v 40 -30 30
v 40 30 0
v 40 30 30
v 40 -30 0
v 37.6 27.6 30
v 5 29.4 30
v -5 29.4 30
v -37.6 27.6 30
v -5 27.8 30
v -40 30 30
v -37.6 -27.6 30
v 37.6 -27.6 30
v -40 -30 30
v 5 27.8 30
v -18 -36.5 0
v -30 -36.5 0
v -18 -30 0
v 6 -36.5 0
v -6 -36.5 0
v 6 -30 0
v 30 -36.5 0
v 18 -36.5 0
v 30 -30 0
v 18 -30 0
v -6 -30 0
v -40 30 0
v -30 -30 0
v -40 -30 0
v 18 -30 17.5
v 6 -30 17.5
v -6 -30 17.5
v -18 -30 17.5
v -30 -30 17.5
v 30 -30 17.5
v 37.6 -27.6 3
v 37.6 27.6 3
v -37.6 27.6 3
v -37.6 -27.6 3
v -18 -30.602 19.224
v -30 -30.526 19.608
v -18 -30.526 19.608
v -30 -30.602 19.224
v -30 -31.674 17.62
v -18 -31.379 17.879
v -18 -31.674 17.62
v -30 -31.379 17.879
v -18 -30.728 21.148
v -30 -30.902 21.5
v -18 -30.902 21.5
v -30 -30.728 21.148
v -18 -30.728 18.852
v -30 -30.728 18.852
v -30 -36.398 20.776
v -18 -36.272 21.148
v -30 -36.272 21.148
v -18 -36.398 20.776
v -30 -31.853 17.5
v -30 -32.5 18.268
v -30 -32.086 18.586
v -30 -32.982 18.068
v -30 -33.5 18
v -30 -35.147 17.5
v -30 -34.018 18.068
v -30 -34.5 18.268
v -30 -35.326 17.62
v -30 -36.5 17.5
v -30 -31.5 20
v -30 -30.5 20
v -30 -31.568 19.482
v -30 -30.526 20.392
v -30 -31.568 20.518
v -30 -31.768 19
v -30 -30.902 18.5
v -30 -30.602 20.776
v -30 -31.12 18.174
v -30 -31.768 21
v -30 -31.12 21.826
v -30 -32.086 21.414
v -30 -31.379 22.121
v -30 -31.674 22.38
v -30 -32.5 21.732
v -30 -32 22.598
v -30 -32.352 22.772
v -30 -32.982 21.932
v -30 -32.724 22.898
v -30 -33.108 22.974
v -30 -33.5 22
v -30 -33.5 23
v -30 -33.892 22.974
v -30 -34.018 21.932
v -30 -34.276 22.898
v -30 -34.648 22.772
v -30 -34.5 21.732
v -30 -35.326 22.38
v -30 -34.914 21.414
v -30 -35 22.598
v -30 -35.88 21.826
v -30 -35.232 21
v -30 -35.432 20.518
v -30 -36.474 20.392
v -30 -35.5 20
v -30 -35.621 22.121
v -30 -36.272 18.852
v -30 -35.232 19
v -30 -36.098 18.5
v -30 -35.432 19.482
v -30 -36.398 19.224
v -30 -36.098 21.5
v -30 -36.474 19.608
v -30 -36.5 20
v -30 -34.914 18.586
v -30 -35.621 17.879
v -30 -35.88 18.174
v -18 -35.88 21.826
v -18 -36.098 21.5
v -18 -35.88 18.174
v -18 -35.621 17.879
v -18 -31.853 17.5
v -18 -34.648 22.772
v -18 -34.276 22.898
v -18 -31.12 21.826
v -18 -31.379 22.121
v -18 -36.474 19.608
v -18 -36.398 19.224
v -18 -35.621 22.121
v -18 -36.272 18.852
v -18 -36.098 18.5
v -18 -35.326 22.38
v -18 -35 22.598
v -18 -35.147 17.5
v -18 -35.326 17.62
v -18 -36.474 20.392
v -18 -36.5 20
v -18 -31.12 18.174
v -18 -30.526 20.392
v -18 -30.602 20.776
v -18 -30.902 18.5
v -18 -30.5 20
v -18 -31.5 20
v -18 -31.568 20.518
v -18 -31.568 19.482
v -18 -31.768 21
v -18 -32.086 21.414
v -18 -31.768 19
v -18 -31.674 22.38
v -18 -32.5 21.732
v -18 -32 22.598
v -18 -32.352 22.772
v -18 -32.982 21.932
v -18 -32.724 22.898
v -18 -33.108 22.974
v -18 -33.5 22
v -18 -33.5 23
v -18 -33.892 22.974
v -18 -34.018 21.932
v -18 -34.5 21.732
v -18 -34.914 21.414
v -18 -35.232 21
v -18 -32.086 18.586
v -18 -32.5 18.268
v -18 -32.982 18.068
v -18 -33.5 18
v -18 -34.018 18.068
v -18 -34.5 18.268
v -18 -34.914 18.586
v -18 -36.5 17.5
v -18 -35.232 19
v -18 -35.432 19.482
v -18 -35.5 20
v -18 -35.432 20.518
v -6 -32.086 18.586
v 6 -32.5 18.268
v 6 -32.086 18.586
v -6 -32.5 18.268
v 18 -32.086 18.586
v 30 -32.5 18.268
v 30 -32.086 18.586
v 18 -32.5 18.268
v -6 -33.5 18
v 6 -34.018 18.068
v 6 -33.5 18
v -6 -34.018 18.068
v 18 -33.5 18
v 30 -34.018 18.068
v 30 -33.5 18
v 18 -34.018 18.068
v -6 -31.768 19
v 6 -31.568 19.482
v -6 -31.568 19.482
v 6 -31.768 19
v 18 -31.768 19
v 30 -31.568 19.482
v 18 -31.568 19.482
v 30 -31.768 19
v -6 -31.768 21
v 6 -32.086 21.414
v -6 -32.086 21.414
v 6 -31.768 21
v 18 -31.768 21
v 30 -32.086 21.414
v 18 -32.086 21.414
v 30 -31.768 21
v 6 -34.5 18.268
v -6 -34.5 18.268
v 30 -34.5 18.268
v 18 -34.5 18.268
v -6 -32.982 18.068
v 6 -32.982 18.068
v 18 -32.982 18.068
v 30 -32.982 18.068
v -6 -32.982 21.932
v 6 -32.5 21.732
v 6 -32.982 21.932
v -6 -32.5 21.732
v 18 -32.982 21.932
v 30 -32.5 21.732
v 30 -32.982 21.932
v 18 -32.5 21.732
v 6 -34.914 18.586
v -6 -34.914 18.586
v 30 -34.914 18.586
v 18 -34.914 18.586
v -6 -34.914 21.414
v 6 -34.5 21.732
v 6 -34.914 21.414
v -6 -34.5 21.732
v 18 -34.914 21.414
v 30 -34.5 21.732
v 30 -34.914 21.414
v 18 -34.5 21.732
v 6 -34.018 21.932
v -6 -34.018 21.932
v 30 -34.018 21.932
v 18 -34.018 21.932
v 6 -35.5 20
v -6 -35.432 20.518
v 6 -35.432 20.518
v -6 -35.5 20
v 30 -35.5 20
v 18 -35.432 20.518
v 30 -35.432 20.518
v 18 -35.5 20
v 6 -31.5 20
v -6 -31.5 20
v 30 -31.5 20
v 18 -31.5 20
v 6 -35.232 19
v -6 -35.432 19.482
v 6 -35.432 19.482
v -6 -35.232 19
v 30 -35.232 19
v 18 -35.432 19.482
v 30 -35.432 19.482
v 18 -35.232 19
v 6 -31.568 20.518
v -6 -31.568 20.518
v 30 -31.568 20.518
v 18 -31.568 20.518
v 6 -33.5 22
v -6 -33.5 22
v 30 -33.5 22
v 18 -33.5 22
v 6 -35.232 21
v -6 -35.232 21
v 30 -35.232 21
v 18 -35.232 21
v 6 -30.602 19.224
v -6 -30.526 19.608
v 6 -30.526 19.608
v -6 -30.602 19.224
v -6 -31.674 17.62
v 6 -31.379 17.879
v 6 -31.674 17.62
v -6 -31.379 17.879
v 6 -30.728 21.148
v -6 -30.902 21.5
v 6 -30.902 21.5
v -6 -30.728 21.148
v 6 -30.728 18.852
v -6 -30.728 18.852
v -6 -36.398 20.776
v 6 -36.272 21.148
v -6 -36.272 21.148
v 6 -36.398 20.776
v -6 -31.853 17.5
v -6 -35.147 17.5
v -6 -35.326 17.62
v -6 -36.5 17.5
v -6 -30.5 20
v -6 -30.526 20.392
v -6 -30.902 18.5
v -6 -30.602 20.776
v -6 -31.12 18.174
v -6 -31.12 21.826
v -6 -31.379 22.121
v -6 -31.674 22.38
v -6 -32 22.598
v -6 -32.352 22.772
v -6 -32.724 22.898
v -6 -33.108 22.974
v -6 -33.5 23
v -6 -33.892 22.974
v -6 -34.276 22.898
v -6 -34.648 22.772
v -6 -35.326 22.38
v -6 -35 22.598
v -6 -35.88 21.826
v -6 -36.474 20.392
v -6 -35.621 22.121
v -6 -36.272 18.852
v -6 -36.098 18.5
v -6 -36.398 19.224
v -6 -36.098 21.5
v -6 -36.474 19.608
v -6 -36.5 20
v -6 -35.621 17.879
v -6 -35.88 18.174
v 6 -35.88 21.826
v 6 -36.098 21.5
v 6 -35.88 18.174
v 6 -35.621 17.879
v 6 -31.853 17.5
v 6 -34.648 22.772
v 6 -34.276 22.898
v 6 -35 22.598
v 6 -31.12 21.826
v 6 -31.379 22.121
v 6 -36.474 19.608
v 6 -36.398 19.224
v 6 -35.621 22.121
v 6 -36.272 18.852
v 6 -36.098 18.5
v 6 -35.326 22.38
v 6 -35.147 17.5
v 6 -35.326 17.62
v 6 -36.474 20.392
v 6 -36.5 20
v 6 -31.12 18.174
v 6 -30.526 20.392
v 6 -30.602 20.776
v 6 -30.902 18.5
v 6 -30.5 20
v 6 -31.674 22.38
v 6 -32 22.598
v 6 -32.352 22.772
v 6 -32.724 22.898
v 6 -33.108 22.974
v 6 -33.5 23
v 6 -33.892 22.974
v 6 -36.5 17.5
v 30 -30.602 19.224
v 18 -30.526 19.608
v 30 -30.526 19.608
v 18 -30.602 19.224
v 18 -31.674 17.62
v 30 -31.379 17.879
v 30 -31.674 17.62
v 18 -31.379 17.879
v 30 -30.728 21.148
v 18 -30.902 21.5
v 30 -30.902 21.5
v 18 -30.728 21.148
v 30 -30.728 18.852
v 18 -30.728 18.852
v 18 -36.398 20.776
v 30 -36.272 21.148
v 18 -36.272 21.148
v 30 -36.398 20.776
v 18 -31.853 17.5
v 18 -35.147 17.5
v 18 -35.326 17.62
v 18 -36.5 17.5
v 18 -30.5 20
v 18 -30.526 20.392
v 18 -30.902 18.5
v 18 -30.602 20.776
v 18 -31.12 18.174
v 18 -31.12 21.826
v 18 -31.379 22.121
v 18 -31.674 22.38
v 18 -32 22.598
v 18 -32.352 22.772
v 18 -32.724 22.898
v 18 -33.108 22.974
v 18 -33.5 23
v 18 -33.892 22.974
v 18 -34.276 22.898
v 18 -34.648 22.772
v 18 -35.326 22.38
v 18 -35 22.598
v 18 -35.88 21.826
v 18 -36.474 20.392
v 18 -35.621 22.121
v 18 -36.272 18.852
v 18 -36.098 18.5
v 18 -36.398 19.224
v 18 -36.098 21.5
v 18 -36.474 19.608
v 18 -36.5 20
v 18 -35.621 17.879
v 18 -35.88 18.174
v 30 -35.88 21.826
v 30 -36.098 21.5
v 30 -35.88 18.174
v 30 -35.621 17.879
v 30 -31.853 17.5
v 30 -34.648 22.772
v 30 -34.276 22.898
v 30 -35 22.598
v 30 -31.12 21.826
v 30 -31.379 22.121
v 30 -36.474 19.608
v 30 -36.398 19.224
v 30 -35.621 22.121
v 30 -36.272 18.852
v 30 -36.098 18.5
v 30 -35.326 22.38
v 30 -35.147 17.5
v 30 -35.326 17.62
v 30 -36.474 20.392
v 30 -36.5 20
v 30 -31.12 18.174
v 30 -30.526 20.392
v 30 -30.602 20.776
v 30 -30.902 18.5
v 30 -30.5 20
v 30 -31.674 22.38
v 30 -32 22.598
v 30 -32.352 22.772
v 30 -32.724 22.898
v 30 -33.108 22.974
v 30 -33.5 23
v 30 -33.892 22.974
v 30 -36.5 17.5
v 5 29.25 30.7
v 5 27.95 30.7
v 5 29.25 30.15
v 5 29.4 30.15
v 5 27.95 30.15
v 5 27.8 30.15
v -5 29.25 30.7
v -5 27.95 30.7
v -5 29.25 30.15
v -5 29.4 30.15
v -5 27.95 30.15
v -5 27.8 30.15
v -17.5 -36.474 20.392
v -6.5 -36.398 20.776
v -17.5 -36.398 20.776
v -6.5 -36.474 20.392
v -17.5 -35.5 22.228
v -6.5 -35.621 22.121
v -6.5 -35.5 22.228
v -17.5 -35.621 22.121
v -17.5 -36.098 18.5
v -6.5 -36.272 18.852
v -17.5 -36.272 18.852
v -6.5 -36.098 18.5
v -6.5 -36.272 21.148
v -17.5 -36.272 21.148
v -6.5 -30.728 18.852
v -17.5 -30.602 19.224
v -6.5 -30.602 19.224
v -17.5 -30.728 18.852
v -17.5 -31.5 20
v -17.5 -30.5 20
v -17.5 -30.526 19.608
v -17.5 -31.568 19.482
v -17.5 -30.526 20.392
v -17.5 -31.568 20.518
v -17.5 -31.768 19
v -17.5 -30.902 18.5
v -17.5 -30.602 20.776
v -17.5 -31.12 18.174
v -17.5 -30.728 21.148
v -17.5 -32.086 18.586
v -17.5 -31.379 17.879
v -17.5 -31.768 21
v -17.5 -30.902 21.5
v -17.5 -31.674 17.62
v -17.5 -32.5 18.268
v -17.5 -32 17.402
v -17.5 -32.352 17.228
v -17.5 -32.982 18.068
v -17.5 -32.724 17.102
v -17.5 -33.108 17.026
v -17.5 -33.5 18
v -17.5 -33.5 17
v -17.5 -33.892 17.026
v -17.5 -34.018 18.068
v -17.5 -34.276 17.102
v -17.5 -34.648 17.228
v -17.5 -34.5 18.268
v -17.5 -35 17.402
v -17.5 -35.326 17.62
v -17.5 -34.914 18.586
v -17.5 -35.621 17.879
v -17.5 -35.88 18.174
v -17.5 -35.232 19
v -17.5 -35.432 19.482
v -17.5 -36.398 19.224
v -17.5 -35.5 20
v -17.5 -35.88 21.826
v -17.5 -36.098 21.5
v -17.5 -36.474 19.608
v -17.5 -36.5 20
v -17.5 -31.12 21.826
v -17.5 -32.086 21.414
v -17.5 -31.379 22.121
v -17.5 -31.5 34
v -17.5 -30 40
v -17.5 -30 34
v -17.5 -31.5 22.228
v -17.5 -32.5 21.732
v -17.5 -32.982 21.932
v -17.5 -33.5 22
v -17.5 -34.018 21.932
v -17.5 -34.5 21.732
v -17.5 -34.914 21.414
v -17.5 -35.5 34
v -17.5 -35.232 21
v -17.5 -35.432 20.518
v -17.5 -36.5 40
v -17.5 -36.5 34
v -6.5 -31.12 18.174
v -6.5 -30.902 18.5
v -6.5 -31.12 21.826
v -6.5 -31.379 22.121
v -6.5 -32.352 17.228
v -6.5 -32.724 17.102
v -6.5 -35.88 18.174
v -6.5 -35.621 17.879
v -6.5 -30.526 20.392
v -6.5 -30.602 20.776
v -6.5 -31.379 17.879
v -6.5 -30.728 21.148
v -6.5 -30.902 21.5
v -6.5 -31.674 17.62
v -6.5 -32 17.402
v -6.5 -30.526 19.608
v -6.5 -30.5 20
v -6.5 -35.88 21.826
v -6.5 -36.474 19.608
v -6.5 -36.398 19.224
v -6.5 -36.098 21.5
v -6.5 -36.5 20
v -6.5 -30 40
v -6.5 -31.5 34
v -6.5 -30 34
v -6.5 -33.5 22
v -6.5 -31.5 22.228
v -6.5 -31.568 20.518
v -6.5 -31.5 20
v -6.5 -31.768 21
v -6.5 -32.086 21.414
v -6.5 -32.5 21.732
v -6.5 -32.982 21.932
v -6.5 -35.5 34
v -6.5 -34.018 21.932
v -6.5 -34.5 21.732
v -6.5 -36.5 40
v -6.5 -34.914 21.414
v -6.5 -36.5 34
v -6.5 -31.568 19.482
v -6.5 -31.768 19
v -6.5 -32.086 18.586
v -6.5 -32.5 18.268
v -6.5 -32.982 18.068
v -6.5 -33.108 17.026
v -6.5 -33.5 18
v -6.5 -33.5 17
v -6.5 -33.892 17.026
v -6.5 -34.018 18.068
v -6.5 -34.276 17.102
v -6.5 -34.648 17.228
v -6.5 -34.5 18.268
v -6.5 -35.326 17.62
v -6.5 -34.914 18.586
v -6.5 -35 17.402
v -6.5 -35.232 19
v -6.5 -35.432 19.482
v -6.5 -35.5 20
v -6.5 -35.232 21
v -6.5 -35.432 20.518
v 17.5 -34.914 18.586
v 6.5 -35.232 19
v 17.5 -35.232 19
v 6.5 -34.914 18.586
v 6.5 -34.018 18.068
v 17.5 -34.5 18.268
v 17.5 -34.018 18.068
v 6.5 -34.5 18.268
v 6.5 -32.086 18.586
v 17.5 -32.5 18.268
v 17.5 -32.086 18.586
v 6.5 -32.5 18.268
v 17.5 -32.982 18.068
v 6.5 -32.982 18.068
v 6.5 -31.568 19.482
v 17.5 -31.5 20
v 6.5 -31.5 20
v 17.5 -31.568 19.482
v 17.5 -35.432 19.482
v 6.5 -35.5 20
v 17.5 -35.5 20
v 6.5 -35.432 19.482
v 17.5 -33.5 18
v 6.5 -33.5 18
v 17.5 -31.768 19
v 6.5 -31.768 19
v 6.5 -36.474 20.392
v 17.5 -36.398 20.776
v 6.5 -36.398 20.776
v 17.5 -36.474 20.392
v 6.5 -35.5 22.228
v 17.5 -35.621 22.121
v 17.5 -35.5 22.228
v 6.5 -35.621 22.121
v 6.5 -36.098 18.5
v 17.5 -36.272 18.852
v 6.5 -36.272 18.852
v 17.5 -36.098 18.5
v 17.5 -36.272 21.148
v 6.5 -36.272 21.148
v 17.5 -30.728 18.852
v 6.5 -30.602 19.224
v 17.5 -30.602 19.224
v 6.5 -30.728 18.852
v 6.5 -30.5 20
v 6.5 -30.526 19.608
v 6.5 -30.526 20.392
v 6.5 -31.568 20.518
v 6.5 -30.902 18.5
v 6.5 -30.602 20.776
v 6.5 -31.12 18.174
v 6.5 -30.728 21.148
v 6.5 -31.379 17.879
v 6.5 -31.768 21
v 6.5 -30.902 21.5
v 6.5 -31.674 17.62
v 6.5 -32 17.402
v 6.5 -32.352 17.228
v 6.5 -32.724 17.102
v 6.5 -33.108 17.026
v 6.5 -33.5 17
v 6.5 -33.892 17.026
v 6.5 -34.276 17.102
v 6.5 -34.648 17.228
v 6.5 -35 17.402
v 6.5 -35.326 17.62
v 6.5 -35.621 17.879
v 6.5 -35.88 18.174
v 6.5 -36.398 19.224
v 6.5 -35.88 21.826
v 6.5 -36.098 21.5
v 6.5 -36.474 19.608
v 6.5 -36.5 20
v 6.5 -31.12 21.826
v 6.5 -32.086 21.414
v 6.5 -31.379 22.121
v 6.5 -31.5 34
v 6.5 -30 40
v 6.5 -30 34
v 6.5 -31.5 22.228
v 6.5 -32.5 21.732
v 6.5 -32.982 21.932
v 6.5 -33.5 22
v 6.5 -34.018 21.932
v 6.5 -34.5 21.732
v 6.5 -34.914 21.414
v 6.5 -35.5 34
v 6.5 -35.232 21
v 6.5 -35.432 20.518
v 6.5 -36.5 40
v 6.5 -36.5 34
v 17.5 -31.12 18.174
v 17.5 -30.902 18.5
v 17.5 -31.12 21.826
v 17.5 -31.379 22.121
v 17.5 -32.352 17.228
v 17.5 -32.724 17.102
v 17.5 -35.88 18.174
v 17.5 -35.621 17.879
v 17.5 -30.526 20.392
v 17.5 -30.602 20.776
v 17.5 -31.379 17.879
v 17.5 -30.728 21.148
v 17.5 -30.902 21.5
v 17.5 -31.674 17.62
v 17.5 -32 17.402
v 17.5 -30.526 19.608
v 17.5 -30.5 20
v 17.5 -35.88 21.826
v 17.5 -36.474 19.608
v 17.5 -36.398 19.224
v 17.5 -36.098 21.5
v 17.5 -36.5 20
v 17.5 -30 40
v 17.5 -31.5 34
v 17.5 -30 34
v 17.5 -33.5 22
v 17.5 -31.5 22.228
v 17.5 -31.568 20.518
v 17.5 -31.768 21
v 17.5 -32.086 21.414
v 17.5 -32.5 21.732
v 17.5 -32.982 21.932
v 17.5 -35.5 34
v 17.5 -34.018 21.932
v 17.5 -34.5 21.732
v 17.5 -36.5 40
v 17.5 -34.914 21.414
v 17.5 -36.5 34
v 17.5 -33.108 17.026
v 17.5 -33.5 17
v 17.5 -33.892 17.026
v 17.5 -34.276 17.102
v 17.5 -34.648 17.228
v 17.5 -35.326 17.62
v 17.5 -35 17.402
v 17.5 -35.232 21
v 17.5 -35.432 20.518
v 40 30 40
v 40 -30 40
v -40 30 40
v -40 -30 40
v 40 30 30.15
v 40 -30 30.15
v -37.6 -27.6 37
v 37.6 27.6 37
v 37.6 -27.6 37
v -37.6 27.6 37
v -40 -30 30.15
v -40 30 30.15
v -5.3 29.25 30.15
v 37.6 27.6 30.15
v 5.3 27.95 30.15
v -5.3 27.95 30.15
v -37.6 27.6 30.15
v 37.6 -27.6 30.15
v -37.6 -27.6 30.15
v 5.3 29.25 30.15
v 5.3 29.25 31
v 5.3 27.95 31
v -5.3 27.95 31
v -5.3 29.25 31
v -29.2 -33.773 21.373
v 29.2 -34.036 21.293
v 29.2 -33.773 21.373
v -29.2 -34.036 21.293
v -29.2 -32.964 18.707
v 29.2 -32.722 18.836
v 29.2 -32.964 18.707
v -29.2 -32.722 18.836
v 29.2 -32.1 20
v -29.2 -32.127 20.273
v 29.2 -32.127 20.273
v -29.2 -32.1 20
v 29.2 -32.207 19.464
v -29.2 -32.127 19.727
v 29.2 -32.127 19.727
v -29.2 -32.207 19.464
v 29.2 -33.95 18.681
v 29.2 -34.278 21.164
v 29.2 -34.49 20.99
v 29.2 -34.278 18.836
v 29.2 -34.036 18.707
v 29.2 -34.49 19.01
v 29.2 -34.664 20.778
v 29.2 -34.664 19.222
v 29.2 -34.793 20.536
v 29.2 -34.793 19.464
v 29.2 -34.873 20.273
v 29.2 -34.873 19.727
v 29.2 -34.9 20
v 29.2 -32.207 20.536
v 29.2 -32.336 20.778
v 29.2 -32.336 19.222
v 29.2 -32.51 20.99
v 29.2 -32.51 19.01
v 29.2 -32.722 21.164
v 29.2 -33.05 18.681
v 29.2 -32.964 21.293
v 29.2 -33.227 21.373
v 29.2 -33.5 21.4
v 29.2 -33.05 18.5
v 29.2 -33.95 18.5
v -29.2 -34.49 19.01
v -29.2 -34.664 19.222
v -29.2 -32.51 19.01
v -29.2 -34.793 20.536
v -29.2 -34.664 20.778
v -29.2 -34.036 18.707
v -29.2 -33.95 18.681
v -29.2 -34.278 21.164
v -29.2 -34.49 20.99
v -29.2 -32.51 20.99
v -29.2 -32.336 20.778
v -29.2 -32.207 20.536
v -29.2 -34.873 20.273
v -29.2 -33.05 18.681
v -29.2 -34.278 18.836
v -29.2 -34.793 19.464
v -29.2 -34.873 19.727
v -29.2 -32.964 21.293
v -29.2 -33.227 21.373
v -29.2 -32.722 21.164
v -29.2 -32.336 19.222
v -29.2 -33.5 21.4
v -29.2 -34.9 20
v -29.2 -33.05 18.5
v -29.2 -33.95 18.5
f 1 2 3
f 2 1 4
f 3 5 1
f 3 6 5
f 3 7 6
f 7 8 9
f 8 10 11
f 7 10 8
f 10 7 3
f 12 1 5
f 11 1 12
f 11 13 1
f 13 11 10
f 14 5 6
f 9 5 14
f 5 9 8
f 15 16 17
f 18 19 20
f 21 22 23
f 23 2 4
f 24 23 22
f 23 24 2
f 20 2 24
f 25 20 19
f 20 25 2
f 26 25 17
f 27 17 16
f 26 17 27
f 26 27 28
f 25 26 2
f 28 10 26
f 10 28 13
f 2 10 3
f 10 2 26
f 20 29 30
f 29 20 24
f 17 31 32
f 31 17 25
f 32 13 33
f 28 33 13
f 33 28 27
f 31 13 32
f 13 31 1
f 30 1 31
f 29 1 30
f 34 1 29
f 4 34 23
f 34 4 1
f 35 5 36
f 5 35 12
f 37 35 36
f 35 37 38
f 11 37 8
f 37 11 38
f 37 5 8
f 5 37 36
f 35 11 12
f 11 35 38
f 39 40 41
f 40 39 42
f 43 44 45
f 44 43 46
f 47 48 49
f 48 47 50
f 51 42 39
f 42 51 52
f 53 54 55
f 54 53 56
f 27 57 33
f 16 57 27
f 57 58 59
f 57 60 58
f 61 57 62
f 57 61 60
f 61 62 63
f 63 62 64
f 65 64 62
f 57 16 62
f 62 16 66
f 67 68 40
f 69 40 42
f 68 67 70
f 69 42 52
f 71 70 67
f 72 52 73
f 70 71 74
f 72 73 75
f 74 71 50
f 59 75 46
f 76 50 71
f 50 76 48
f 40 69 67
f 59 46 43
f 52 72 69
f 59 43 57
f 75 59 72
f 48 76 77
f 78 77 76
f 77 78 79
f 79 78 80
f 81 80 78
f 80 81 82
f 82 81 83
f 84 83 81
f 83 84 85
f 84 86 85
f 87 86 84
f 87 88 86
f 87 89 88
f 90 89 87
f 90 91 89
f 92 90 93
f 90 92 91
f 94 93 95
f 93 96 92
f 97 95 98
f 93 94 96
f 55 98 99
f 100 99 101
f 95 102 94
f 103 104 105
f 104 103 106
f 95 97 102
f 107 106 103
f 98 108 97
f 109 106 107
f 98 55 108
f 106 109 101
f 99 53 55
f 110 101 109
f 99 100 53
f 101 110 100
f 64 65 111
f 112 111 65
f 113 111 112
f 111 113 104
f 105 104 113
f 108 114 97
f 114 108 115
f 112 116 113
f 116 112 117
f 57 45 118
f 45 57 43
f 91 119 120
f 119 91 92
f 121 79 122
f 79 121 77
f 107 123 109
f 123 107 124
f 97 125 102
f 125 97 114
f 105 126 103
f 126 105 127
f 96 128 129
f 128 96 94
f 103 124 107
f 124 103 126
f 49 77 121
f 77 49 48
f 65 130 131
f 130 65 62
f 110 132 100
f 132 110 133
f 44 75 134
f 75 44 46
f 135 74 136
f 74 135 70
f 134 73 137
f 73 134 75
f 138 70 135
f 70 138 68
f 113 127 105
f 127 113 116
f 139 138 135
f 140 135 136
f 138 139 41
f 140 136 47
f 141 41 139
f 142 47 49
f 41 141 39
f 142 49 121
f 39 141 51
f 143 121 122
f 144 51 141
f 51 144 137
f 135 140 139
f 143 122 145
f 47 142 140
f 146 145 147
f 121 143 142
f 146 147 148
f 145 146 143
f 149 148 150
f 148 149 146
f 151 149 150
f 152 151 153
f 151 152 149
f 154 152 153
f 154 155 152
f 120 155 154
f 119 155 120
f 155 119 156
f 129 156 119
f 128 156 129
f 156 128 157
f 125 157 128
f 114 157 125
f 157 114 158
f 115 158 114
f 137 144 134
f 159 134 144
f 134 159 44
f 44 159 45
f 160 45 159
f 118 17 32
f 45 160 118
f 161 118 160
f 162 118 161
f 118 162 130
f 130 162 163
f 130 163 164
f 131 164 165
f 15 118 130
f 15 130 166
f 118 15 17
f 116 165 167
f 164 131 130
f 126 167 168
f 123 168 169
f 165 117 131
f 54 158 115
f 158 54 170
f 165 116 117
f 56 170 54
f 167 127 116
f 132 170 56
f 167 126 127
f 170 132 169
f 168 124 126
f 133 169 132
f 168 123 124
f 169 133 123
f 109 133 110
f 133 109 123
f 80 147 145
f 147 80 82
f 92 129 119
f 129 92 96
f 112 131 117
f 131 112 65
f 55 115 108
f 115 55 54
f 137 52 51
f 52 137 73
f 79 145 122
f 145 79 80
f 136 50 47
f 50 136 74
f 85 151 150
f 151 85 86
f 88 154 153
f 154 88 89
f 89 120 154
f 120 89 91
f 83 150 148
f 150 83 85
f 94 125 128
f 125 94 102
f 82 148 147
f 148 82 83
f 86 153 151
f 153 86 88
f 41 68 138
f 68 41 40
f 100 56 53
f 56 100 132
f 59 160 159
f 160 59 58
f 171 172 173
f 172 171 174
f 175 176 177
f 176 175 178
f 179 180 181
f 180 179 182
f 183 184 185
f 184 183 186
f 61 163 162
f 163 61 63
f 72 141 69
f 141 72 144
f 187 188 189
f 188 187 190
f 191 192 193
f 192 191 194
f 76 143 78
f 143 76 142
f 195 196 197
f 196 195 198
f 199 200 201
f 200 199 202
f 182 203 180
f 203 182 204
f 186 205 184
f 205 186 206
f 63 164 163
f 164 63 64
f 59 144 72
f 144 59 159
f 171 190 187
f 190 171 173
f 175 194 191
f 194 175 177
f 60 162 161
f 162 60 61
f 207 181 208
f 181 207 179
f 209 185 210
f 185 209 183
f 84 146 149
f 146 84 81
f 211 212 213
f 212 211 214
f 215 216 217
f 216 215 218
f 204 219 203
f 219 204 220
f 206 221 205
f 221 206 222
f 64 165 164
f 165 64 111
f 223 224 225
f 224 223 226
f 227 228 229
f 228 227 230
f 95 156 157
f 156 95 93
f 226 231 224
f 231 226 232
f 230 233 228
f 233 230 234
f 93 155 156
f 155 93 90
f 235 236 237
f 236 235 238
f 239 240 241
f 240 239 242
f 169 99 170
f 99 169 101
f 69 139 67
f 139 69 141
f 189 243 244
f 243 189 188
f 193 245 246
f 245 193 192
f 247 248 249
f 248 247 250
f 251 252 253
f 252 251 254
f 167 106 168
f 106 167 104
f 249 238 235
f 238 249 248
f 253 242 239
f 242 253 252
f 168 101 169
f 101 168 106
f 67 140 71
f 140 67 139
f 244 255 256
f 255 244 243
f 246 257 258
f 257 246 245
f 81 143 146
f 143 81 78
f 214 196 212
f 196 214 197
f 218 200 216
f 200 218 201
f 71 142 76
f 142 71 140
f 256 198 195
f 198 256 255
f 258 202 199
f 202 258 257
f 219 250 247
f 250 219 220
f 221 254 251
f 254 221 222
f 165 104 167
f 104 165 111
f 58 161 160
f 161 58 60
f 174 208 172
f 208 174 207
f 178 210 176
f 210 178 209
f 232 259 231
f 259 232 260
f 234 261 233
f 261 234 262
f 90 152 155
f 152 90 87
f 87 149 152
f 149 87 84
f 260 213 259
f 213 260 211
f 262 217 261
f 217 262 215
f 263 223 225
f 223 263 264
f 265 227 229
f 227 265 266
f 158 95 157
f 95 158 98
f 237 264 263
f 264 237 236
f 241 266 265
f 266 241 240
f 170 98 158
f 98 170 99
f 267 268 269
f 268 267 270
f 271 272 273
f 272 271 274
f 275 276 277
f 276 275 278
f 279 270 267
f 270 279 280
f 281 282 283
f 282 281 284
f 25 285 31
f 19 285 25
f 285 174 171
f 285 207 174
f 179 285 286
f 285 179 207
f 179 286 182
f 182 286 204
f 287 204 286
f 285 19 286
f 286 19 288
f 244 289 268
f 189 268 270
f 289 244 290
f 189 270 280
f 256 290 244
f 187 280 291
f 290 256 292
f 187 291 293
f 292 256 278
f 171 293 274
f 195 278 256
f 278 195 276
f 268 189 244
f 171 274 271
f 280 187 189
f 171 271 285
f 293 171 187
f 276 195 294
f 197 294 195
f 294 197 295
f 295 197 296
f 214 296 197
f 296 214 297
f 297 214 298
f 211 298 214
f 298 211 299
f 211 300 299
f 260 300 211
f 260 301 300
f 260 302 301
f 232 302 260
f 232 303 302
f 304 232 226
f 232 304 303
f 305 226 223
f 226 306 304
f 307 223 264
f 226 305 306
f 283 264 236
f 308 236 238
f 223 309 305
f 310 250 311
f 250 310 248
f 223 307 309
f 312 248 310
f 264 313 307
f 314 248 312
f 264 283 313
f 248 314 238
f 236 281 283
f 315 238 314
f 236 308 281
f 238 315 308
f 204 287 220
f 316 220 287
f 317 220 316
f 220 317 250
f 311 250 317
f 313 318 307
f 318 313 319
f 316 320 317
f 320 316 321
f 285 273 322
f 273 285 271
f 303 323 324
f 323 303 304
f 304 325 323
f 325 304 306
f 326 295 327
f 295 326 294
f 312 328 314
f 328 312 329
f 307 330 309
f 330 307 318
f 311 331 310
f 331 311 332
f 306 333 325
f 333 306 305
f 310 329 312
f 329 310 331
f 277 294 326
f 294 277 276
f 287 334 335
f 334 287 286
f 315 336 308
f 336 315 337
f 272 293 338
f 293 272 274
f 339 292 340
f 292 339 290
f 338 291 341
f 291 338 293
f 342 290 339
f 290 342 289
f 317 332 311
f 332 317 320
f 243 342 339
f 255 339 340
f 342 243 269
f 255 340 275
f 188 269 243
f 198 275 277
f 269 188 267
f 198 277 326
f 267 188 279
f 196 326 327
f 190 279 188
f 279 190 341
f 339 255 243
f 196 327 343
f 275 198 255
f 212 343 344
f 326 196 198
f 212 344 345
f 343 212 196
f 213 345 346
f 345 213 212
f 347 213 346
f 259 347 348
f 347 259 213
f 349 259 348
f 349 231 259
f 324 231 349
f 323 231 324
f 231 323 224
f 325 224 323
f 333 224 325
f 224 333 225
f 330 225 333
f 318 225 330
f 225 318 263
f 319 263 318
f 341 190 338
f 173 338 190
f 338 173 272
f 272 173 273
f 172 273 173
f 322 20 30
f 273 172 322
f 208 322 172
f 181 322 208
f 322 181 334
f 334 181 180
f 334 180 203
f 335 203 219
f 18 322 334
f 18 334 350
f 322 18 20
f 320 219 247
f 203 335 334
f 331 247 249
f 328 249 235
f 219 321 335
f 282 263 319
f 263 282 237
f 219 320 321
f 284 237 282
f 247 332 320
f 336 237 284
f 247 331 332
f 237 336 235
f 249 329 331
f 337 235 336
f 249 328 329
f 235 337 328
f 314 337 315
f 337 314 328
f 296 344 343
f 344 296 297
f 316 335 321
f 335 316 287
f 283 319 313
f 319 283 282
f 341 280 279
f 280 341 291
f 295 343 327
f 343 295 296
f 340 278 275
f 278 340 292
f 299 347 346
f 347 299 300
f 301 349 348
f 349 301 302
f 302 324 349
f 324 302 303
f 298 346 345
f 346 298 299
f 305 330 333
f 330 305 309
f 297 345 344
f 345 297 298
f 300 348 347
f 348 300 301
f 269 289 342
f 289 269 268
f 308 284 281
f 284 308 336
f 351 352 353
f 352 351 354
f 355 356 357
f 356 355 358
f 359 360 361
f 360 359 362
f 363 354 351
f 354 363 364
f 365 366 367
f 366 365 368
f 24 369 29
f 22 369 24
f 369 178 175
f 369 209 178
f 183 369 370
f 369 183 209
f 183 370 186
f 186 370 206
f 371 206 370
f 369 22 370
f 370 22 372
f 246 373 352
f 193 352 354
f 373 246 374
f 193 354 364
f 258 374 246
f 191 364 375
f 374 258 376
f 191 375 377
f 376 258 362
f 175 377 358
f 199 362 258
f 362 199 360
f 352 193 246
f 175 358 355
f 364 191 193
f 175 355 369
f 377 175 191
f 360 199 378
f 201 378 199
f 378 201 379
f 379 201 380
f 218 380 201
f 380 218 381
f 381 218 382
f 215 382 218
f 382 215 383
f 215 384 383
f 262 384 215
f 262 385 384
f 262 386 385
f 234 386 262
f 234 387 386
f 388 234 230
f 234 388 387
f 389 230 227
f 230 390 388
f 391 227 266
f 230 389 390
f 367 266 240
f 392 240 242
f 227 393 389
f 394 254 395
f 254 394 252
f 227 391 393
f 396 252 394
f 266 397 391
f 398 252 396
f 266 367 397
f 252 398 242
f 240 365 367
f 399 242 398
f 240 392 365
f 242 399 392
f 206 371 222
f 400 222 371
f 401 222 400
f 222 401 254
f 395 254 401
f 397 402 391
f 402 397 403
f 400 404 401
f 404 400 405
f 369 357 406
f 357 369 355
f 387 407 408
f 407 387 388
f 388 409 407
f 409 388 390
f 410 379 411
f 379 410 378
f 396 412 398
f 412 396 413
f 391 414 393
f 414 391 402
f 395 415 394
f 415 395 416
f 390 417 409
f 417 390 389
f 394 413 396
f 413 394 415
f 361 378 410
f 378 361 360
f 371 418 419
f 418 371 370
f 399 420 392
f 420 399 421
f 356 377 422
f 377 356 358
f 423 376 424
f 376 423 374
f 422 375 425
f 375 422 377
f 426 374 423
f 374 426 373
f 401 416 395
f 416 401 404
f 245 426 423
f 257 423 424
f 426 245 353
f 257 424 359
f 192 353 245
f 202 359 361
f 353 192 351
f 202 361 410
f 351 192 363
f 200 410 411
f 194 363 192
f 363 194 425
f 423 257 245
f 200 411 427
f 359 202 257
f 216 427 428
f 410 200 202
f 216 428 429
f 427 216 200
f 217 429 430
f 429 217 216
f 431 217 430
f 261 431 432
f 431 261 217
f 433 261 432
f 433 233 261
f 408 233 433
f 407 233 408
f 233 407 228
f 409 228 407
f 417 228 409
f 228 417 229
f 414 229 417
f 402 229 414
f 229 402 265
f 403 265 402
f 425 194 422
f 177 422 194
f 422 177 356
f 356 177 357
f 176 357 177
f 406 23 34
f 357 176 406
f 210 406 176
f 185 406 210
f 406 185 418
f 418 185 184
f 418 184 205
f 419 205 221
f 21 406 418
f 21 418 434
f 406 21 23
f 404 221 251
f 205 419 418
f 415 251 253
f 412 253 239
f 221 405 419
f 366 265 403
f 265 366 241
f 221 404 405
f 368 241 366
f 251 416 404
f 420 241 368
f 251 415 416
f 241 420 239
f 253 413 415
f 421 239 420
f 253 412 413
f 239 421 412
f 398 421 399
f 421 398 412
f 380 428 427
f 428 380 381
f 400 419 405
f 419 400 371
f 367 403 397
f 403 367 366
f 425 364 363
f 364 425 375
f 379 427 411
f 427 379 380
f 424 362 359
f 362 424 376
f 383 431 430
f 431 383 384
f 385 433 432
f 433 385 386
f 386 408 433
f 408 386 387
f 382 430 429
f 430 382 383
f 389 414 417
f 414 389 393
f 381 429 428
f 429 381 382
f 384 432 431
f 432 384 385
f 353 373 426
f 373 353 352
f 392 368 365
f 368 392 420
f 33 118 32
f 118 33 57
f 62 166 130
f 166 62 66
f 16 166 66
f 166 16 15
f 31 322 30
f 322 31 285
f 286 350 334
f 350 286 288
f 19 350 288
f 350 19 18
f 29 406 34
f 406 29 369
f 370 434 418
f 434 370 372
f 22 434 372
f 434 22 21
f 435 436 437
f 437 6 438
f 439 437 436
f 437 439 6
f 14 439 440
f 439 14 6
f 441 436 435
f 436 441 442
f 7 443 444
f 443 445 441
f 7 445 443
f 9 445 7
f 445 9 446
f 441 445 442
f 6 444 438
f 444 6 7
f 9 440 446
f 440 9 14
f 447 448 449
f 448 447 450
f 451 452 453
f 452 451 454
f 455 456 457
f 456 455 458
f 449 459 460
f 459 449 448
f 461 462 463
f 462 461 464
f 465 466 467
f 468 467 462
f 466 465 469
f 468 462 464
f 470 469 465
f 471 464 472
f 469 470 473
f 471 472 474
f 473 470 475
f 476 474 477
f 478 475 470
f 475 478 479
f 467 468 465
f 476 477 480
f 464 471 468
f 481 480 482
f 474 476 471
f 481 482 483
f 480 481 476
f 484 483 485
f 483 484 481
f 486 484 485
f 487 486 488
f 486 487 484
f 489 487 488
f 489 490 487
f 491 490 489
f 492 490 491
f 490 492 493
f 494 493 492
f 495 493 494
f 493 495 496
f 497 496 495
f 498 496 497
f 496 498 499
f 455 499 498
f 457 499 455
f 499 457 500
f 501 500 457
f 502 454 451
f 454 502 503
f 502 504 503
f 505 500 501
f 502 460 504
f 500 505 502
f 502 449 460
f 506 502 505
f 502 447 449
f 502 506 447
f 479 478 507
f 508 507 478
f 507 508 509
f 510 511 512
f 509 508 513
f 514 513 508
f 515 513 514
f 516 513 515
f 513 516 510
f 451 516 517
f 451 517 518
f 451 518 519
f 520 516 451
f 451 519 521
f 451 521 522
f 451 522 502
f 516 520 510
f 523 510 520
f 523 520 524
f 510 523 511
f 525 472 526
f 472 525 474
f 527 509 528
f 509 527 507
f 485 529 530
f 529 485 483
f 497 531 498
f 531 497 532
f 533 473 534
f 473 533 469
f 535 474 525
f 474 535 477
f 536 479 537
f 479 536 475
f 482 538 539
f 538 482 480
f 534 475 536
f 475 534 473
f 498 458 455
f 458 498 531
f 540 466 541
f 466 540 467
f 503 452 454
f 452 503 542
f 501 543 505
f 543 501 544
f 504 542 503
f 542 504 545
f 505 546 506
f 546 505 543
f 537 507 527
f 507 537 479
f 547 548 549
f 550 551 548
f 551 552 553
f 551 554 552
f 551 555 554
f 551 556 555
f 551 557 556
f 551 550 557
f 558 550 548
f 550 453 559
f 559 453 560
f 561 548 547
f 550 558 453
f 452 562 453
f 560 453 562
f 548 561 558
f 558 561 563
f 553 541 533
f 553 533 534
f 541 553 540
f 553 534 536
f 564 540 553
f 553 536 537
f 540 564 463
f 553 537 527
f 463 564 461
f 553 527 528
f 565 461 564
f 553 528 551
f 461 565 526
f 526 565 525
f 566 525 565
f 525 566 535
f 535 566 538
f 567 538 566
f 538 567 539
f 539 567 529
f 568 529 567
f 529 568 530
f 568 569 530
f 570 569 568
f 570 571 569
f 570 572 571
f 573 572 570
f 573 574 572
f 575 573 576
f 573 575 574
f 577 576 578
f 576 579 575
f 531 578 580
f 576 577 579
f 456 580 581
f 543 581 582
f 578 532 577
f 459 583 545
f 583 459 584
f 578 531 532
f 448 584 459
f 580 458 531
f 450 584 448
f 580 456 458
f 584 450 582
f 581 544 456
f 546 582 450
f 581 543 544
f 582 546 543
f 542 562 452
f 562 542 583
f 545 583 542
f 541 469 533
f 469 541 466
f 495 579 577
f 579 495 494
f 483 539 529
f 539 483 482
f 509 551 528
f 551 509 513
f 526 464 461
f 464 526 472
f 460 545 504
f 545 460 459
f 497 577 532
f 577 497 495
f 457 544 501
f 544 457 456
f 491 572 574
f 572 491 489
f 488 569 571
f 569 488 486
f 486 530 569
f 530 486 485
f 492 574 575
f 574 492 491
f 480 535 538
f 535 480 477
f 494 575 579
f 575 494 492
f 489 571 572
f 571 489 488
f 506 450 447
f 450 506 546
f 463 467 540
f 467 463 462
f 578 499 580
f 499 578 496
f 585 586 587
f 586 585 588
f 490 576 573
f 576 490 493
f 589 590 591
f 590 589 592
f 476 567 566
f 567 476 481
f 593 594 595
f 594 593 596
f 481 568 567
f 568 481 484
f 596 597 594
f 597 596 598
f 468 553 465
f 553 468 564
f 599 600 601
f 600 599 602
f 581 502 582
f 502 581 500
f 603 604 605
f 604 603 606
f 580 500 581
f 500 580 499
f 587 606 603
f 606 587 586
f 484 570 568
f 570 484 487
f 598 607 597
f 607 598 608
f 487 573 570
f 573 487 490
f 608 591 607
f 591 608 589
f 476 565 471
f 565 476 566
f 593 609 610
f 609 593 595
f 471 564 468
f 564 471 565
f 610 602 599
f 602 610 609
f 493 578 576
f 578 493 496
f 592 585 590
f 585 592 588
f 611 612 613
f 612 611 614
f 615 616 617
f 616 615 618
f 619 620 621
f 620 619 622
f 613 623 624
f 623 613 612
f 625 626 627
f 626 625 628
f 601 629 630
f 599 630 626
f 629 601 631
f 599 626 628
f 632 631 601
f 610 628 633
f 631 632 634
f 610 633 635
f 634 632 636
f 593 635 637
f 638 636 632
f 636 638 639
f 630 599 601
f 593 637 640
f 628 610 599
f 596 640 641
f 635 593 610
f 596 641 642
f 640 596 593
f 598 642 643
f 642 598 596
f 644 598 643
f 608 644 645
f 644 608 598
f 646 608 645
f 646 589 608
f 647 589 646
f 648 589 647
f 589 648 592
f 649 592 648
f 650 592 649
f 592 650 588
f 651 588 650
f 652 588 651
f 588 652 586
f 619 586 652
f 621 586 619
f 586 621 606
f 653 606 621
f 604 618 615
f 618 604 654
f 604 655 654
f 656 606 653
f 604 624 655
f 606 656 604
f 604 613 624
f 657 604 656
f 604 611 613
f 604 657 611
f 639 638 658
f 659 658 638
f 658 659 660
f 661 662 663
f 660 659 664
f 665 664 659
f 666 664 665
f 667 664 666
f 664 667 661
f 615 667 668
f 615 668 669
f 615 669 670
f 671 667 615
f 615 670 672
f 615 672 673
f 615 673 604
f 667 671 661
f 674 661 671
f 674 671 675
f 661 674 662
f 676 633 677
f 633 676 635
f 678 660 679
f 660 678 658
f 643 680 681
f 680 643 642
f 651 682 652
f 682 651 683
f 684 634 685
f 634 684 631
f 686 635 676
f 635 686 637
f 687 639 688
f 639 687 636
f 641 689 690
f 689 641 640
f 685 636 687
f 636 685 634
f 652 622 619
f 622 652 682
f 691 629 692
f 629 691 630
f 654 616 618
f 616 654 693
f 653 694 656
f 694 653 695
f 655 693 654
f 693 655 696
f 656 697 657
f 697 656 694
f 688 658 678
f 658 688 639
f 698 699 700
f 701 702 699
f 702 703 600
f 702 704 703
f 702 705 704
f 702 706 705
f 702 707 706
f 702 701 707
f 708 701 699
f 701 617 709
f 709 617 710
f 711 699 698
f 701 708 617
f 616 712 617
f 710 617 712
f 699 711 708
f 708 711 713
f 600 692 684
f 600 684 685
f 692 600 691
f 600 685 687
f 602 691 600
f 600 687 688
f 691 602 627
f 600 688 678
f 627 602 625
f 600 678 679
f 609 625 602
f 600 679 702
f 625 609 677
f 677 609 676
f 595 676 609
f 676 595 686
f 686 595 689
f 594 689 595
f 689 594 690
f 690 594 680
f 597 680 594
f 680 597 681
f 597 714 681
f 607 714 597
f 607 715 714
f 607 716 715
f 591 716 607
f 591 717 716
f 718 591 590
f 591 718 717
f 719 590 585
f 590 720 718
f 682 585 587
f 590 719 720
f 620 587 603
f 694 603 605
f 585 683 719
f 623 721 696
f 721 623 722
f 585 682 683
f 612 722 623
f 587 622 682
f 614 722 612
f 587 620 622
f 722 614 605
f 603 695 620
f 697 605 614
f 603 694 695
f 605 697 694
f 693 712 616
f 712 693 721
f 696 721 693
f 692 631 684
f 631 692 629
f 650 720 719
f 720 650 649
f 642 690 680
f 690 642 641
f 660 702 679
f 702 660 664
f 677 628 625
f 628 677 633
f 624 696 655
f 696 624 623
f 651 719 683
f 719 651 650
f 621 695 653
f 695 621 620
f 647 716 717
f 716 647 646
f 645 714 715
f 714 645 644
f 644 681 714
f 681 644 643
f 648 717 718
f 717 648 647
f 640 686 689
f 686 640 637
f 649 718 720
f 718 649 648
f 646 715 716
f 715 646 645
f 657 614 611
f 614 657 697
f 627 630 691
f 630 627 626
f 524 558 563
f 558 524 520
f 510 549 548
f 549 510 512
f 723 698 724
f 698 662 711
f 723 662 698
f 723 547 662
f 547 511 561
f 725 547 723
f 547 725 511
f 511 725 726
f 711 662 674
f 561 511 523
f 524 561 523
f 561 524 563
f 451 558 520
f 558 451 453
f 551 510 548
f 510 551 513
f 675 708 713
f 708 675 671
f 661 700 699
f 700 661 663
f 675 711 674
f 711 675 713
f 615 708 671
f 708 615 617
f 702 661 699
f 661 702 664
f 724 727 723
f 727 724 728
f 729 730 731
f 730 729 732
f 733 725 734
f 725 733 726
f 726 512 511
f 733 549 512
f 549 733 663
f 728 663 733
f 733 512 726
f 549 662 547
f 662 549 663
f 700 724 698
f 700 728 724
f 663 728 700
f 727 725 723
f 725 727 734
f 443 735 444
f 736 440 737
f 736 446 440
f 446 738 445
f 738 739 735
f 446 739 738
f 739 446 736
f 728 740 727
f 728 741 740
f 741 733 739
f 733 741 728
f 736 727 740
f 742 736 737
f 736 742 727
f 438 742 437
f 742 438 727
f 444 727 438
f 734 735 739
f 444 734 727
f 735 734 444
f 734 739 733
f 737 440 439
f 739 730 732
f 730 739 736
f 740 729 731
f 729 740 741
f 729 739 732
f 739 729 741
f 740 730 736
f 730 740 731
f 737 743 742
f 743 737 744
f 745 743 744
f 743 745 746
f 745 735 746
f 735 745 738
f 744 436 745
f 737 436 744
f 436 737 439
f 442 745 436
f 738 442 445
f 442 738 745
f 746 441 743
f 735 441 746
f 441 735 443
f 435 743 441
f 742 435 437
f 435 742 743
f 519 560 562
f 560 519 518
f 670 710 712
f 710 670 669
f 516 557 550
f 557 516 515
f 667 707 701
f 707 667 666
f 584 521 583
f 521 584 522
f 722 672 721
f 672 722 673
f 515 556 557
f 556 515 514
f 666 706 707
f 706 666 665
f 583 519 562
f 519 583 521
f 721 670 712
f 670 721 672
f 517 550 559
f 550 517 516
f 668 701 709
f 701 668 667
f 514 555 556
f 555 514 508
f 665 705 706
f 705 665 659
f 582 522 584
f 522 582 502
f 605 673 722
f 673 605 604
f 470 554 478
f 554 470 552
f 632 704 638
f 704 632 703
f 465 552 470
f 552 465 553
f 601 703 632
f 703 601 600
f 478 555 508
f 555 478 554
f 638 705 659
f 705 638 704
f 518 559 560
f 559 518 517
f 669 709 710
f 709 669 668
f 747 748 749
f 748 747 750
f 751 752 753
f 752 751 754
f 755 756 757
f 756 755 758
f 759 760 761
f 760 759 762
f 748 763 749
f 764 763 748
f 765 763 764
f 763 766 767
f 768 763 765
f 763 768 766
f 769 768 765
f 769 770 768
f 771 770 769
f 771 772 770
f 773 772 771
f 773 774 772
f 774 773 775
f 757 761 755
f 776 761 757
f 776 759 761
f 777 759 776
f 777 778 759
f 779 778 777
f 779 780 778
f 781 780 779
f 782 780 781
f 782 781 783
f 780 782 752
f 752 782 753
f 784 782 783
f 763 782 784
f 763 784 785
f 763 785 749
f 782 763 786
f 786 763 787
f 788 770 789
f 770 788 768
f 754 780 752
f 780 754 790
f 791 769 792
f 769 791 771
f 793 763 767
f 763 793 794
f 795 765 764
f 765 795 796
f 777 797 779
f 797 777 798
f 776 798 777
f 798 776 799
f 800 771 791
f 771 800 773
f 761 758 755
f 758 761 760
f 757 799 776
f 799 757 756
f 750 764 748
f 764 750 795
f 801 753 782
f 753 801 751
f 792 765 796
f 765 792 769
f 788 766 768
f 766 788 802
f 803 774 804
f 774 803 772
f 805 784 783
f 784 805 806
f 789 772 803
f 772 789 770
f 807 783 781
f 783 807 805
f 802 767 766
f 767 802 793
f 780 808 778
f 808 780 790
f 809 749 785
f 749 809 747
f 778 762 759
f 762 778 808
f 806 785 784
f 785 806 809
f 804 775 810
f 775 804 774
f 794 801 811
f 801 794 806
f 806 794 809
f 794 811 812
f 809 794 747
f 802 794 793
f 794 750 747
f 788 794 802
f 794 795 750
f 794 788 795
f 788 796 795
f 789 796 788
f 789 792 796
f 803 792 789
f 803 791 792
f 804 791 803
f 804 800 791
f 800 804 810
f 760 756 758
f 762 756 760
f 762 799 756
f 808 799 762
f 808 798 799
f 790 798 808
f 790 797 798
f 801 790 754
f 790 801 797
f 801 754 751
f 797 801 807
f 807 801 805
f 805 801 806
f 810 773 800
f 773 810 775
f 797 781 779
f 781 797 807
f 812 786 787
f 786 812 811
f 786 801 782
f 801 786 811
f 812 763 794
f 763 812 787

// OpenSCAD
part = "assembly"; // [base, lid, pin, assembly]
cadverify_only = "";
module instance(name, part, unit = 1) {
  echo(cadverify_instance = [name, part, unit]);
  if (cadverify_only == "" || cadverify_only == name) children();
}
Ya = -33.5; Za = 20; Kr = 3.0; Br = 2.0; Pr = 1.4;
BX = [[-30,-18],[-6,6],[18,30]];
LX = [[-17.5,-6.5],[6.5,17.5]];
module barrelX(x0, x1) {
  difference() {
    translate([0,Ya,Za]) rotate([0,90,0]) translate([0,0,(x0+x1)/2])
      cylinder(h=x1-x0, r=Kr, center=true, $fn=48);
    translate([0,Ya,Za]) rotate([0,90,0]) translate([0,0,(x0+x1)/2])
      cylinder(h=(x1-x0)+1.0, r=Br, center=true, $fn=24);
  }
}
module base_geom() {
  difference() {
    union() {
      difference() {
        translate([-40,-30,0]) cube([80,60,30]);
        translate([-37.6,-27.6,3]) cube([75.2,55.2,27.01]);
      }
      for (b=BX) {
        translate([b[0],-36.5,0]) cube([b[1]-b[0],6.5,17.5]);
        barrelX(b[0], b[1]);
      }
      translate([-5,27.8,30]) cube([10,1.6,0.7]);
    }
    translate([0,Ya,Za]) rotate([0,90,0]) translate([0,0,0])
      cylinder(h=62, r=Br, center=true, $fn=24);
  }
}
module lid_open() {
  difference() {
    union() {
      translate([-40,-97,0]) cube([80,60,3]);
      translate([-40,-97,3]) cube([80,2.4,6.85]);
      translate([-40,-39.4,3]) cube([80,2.4,6.85]);
      translate([-40,-97,3]) cube([2.4,60,6.85]);
      translate([37.6,-97,3]) cube([2.4,60,6.85]);
      for (b=LX) {
        translate([b[0],-39,0]) cube([b[1]-b[0],8.5,6]);
        translate([b[0],-35.5,3]) cube([b[1]-b[0],4,17.5]);
        barrelX(b[0], b[1]);
      }
    }
    translate([-5.3,-96.25,9.0]) cube([10.6,1.3,1.1]);
    translate([0,Ya,Za]) rotate([0,90,0]) translate([0,0,0])
      cylinder(h=62, r=Br, center=true, $fn=24);
  }
}
module pin_geom() {
  union() {
    translate([-29.2,0,1.5]) rotate([0,90,0])
      cylinder(h=58.4, r=Pr, center=false, $fn=32);
    translate([-29.2,-0.45,0]) cube([58.4,0.9,0.4]);
  }
}
module lid_closed() {
  translate([0,Ya,Za]) rotate([180,0,0]) translate([0,-Ya,-Za]) lid_open();
}
module pin_placed() {
  translate([0,Ya,Za-1.5]) pin_geom();
}
if (part=="base") {
  base_geom();
  echo(cadverify_spec=[
    ["bounds", [[-40,-36.5,0],[40,30,30.7]]],
    ["bodies", 1],
    ["support_faces", [["base","-z",4000]]],
    ["overhangs_allowed", [["hinge", [[-30,-37,16],[30,-30,24]]]]],
    ["copies", 1],
    ["details", [
      ["bottom","thickness",[0,0,-1],[0,0,1],3],
      ["cavity","void",[[-37.6,-27.6,3],[37.6,27.6,30]],0.9],
      ["knuckle","material",[[-30,-36.5,17],[-18,-30.5,23]],0.4],
      ["bore","hole",[-31,-33.5,20],[1,0,0],[[0,4.0],[10,4.0]]],
      ["catch","material",[[-5,27.8,30],[5,29.4,30.7]],0.6]
    ]]
  ]);
} else if (part=="lid") {
  lid_open();
  echo(cadverify_spec=[
    ["bounds", [[-40,-97,0],[40,-30.5,23]]],
    ["bodies", 1],
    ["support_faces", [["lid","-z",4000]]],
    ["overhangs_allowed", [["hinge", [[-30,-37,16],[30,-30,24]]]]],
    ["copies", 1],
    ["details", [
      ["plate","thickness",[0,-67,-1],[0,0,1],3],
      ["pocket","void",[[-37.6,-94.6,3],[37.6,-39.4,9.85]],0.9],
      ["knuckle","material",[[-17.5,-36.5,17],[-6.5,-30.5,23]],0.4],
      ["bore","hole",[-18,-33.5,20],[1,0,0],[[0,4.0],[9,4.0]]],
      ["notch","void",[[-5.3,-96.25,9.0],[5.3,-94.95,10.1]],0.9]
    ]]
  ]);
} else if (part=="pin") {
  pin_geom();
  echo(cadverify_spec=[
    ["bounds", [[-29.2,-1.4,0],[29.2,1.4,2.9]]],
    ["bodies", 1],
    ["support_faces", [["pin","-z",50]]],
    ["overhangs_allowed", [["pinFlankA", [[-29.3,-1.1,0.2],[29.3,-0.8,0.6]]],["pinFlankB", [[-29.3,0.8,0.2],[29.3,1.1,0.6]]]]],
    ["copies", 1],
    ["details", [
      ["shaft","thickness",[0,5,1.5],[0,-1,0],2.8],
      ["fin","thickness",[0,0,-1],[0,0,1],2.9]
    ]]
  ]);
} else {
  instance("base","base") base_geom();
  instance("lid","lid") lid_closed();
  instance("pin","pin") pin_placed();
  echo(cadverify_spec=[
    ["bounds", [[-40,-36.5,0],[40,30,40]]],
    ["support_faces", [["bed","-z",4000]]],
    ["allowed_interferences", [["base","lid","catch press"]]],
    ["motions", [["swing",["lid"],"rotate",[0,-33.5,20],[1,0,0],[0,180],["flex",[["lid","base",0.5,"catch entry"]]]]]],
    ["assembly_order", [[["base"],[0,0,0]],[["lid"],[0,0,1]],[["pin"],[-1,0,0]]]],
    ["print_in_place", 0.4],
    ["print_pose", [["swing",180]]],
    ["overhangs_allowed", [["hinge", [[-30,-37,16],[30,-30,24]]]]]
  ]);
}
